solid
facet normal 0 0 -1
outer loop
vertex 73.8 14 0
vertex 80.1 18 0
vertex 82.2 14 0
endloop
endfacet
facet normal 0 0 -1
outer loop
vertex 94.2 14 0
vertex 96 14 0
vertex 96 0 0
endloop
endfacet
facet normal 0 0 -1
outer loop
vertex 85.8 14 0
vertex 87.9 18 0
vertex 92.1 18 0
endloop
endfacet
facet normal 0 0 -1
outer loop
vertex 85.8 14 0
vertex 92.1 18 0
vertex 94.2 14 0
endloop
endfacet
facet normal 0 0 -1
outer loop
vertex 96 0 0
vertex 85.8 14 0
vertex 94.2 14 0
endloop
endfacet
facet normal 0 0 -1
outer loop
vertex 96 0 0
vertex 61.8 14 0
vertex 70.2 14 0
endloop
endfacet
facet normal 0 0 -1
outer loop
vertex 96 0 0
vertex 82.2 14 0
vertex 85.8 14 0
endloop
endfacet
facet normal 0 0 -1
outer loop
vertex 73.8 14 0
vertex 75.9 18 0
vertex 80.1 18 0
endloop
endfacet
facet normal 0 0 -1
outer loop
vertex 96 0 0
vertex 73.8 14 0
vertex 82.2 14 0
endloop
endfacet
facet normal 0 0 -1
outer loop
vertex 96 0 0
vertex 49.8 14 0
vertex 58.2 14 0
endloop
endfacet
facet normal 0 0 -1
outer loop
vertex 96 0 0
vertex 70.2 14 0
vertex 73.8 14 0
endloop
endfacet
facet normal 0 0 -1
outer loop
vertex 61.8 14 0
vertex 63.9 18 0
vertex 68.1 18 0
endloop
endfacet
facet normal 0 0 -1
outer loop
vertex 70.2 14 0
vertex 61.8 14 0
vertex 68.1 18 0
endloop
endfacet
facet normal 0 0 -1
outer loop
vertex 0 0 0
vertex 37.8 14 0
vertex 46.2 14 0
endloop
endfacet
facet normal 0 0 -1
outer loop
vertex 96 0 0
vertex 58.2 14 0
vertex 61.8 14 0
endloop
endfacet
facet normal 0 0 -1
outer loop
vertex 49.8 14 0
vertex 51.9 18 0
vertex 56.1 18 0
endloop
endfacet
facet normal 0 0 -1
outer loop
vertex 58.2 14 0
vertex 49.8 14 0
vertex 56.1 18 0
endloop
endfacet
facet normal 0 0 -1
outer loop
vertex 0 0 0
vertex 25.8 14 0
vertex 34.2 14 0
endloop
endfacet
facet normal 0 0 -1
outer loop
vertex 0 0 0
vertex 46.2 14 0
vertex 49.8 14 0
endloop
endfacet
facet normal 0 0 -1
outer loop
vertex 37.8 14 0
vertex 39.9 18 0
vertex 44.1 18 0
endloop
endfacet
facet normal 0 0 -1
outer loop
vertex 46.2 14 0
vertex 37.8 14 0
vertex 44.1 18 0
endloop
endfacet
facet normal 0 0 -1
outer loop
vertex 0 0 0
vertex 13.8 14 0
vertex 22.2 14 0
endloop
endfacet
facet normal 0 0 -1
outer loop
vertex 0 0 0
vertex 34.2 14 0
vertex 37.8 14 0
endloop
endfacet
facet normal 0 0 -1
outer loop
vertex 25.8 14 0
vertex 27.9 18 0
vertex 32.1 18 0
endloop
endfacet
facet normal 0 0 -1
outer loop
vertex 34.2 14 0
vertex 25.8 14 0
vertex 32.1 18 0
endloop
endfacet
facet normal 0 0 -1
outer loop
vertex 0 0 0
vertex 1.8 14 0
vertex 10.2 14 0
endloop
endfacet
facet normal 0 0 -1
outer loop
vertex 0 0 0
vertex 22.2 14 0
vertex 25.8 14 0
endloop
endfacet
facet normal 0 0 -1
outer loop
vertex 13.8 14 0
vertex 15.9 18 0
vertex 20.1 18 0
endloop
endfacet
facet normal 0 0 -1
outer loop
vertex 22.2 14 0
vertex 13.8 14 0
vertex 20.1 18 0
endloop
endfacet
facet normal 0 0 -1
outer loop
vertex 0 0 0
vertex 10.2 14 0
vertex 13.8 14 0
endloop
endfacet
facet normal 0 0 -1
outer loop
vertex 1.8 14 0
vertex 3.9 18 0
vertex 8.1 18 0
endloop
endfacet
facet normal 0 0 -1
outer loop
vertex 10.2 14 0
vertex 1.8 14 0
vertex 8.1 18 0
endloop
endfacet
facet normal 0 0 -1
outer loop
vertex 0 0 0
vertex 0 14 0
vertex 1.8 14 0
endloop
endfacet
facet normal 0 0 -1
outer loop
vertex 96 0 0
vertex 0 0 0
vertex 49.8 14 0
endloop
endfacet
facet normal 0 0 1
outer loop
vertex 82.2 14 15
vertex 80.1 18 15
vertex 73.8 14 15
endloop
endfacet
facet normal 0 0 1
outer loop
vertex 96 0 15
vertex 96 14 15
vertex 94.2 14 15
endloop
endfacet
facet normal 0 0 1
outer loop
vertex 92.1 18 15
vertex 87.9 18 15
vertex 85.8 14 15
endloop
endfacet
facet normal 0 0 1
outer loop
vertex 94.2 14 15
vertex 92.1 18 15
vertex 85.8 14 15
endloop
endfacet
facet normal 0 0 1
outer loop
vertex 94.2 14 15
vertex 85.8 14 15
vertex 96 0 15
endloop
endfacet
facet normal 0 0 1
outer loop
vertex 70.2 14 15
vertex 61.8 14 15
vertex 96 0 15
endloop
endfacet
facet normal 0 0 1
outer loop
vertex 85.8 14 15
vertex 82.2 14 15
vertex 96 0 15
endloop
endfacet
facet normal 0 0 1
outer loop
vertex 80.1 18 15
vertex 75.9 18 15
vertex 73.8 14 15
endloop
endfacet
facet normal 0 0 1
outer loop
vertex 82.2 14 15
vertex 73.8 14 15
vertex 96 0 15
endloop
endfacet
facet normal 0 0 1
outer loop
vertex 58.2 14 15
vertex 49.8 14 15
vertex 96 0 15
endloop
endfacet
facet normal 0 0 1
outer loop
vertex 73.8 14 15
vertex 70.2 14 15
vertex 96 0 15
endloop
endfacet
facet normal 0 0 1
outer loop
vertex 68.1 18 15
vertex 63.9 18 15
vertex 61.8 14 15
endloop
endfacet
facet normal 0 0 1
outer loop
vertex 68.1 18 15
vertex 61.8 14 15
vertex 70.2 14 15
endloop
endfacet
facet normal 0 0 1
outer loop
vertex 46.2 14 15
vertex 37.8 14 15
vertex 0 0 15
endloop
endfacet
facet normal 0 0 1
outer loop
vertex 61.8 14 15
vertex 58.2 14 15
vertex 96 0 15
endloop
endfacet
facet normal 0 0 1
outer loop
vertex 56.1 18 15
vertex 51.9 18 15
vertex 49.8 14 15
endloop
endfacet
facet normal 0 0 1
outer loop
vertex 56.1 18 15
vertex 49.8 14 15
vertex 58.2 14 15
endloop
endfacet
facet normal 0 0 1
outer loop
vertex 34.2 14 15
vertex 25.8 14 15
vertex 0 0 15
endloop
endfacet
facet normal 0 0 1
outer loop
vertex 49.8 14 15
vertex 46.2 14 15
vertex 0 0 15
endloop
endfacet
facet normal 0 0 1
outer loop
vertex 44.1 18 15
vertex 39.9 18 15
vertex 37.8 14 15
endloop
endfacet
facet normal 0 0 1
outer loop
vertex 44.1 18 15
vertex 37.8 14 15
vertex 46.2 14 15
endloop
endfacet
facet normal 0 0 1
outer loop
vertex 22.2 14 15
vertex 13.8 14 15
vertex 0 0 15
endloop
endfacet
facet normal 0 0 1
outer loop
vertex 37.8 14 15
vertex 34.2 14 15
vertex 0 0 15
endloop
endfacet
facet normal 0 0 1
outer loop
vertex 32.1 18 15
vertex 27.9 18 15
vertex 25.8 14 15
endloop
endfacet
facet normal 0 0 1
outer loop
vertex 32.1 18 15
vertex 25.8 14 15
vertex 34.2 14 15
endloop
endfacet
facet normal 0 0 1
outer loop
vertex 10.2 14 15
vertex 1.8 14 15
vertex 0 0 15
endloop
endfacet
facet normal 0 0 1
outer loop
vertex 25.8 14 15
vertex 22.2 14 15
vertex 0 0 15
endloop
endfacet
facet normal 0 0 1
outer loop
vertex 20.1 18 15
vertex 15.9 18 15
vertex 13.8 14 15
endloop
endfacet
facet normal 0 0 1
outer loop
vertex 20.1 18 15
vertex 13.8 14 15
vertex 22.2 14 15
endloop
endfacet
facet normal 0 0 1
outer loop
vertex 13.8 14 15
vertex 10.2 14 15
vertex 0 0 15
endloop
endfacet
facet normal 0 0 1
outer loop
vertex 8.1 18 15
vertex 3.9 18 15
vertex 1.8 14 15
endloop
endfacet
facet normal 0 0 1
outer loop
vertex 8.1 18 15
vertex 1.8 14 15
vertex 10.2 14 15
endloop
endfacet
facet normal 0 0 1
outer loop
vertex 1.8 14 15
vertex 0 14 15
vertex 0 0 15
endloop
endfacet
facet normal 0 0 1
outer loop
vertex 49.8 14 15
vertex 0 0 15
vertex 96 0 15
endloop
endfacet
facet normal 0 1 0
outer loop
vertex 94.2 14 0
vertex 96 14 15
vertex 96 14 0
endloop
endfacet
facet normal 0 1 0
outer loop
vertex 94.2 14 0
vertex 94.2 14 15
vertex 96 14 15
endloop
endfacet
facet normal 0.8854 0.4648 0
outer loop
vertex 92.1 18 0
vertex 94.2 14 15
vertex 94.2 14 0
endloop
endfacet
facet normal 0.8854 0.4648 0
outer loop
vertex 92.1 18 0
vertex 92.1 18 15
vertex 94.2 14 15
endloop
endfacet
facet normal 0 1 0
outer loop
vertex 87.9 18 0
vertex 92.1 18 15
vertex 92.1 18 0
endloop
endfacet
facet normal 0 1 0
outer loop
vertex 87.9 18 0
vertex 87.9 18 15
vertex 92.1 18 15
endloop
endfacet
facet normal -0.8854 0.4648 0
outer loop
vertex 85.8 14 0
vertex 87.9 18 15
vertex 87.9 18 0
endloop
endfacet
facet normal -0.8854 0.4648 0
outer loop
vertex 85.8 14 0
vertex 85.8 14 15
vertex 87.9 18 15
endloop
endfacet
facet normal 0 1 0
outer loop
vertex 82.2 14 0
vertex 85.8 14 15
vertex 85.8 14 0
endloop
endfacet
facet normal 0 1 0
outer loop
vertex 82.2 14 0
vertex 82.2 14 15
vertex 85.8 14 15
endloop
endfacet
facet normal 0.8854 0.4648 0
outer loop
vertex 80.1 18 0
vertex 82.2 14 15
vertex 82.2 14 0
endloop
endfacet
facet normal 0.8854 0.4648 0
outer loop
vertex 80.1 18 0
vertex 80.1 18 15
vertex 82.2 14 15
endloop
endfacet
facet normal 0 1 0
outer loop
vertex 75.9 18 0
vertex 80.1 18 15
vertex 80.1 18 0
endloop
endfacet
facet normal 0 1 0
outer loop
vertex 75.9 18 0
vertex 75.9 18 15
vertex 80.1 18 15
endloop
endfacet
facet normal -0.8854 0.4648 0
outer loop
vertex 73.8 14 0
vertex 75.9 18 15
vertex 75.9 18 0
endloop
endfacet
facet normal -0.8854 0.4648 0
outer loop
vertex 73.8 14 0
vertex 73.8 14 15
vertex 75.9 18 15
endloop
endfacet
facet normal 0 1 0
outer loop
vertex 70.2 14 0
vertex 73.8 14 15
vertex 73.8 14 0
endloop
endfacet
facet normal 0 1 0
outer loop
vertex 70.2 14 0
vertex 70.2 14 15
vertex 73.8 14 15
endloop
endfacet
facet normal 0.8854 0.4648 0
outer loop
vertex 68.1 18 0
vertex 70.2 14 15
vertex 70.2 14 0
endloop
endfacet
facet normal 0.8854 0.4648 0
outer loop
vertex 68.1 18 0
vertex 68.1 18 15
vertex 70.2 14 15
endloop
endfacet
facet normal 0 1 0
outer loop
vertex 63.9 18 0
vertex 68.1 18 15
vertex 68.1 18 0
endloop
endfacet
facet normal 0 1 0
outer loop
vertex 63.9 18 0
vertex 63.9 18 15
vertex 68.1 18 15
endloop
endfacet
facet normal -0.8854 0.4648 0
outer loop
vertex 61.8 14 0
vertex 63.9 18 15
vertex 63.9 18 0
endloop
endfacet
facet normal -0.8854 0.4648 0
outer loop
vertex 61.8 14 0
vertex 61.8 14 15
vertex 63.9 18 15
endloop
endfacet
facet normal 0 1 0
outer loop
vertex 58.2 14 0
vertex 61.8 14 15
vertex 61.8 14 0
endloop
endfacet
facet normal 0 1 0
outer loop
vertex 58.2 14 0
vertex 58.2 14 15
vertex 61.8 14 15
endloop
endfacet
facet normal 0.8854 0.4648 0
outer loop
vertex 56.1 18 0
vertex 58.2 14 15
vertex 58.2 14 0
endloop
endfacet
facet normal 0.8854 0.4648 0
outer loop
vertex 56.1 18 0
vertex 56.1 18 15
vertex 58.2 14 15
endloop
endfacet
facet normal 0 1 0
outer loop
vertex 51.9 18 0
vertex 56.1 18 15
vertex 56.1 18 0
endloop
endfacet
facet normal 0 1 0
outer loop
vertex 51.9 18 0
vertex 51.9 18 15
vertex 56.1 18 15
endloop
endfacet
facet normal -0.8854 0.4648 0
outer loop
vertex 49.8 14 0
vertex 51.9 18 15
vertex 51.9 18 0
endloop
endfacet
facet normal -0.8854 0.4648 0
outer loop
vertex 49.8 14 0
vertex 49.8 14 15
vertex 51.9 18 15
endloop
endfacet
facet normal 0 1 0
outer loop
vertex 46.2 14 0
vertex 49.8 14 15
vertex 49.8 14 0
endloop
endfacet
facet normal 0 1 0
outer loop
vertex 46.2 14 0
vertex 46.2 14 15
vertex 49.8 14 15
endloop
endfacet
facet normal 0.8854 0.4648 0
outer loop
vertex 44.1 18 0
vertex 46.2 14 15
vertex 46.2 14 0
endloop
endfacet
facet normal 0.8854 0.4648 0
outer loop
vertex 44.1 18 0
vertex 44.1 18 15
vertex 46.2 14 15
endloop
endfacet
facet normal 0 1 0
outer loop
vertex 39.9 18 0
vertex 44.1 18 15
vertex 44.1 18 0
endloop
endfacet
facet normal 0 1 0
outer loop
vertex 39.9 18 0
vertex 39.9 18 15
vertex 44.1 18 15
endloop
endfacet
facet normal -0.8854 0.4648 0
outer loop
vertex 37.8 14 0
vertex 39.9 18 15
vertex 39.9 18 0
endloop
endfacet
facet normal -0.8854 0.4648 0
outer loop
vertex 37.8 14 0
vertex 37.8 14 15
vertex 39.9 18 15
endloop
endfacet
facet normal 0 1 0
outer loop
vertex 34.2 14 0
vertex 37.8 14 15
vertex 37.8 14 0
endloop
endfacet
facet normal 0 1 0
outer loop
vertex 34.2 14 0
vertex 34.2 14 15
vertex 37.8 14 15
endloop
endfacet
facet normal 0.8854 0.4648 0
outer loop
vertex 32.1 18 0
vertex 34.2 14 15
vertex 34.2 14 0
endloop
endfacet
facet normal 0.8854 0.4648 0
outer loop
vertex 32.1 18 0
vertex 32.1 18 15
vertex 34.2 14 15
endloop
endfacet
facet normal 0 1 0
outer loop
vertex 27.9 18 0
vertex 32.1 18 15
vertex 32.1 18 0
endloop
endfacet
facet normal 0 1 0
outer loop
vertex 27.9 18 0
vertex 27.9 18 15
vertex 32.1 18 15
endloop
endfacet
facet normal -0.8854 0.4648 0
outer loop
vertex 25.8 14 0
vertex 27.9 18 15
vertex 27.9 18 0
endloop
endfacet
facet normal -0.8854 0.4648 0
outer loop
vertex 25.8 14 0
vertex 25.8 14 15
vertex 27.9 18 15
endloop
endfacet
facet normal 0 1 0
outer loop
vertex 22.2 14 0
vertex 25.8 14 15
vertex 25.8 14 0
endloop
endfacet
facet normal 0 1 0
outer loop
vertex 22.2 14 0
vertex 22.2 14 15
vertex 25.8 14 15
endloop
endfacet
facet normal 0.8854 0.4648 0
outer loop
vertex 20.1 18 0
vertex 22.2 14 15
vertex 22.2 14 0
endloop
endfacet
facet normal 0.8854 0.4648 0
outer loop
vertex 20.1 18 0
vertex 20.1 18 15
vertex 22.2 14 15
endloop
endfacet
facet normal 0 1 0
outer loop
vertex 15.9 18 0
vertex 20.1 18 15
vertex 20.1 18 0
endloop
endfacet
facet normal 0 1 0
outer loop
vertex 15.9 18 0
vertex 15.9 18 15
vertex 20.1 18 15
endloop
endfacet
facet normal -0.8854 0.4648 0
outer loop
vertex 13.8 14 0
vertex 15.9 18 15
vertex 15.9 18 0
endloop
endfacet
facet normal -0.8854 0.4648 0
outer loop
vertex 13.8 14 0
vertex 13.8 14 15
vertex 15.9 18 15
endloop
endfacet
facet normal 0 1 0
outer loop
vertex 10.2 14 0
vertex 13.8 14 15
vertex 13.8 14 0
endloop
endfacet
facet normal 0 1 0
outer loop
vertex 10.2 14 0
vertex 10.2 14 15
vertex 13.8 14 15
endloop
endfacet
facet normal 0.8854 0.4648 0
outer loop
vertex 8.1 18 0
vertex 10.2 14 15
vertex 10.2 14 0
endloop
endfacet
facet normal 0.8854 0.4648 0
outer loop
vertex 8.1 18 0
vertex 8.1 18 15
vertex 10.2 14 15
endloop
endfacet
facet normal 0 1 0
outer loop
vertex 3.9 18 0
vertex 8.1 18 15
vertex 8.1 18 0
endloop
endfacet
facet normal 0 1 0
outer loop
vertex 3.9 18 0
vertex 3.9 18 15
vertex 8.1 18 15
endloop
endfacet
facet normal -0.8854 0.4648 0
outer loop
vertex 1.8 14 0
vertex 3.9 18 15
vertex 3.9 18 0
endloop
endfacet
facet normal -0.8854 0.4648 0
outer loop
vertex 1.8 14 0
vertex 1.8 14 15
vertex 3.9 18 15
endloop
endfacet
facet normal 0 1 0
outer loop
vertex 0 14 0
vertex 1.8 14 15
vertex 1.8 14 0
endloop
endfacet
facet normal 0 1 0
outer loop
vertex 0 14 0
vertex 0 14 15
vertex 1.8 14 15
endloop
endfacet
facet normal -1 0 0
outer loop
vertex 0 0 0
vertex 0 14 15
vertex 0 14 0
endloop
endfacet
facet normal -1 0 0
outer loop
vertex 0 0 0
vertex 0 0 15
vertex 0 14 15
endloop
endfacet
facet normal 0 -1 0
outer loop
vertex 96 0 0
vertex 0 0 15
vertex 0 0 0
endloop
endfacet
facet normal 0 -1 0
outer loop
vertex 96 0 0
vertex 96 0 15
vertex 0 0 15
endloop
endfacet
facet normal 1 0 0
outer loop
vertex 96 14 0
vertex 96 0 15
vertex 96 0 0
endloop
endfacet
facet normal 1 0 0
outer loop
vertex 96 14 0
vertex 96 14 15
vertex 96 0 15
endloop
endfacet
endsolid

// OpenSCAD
$fn = 32;

// ----------------------------------------------------------------------
// Gear rack: 8 teeth, pitch 12 mm
// ----------------------------------------------------------------------

// --- parameters (mm) ---
teeth = 8;                // number of teeth
pitch = 12;               // tooth pitch, X
root_w = 8.4;             // tooth width at the root
tip_w = 4.2;              // tooth width at the tip
base_h = 14;              // rack body height, Y
tooth_h = 4;              // tooth height above the body
plate_t = 15;             // rack width, Z (extrusion height)
fit_tol = 0.02;           // declared fit tolerance (prompt contract)
free_tol = 0.2;           // declared free tolerance (prompt contract)

rack_l = teeth * pitch;  // overall length
total_h = base_h + tooth_h;  // overall height

profile = [[0, 0], [96, 0], [96, 14], [94.2, 14], [92.1, 18], [87.9, 18], [85.8, 14], [82.2, 14], [80.1, 18], [75.9, 18], [73.8, 14], [70.2, 14], [68.1, 18], [63.9, 18], [61.8, 14], [58.2, 14], [56.1, 18], [51.9, 18], [49.8, 14], [46.2, 14], [44.1, 18], [39.9, 18], [37.8, 14], [34.2, 14], [32.1, 18], [27.9, 18], [25.8, 14], [22.2, 14], [20.1, 18], [15.9, 18], [13.8, 14], [10.2, 14], [8.1, 18], [3.9, 18], [1.8, 14], [0, 14]];  // primary outline, 36 points, counter clockwise

// --- the one profile operation ---
linear_extrude(height = plate_t) polygon(points = profile);
